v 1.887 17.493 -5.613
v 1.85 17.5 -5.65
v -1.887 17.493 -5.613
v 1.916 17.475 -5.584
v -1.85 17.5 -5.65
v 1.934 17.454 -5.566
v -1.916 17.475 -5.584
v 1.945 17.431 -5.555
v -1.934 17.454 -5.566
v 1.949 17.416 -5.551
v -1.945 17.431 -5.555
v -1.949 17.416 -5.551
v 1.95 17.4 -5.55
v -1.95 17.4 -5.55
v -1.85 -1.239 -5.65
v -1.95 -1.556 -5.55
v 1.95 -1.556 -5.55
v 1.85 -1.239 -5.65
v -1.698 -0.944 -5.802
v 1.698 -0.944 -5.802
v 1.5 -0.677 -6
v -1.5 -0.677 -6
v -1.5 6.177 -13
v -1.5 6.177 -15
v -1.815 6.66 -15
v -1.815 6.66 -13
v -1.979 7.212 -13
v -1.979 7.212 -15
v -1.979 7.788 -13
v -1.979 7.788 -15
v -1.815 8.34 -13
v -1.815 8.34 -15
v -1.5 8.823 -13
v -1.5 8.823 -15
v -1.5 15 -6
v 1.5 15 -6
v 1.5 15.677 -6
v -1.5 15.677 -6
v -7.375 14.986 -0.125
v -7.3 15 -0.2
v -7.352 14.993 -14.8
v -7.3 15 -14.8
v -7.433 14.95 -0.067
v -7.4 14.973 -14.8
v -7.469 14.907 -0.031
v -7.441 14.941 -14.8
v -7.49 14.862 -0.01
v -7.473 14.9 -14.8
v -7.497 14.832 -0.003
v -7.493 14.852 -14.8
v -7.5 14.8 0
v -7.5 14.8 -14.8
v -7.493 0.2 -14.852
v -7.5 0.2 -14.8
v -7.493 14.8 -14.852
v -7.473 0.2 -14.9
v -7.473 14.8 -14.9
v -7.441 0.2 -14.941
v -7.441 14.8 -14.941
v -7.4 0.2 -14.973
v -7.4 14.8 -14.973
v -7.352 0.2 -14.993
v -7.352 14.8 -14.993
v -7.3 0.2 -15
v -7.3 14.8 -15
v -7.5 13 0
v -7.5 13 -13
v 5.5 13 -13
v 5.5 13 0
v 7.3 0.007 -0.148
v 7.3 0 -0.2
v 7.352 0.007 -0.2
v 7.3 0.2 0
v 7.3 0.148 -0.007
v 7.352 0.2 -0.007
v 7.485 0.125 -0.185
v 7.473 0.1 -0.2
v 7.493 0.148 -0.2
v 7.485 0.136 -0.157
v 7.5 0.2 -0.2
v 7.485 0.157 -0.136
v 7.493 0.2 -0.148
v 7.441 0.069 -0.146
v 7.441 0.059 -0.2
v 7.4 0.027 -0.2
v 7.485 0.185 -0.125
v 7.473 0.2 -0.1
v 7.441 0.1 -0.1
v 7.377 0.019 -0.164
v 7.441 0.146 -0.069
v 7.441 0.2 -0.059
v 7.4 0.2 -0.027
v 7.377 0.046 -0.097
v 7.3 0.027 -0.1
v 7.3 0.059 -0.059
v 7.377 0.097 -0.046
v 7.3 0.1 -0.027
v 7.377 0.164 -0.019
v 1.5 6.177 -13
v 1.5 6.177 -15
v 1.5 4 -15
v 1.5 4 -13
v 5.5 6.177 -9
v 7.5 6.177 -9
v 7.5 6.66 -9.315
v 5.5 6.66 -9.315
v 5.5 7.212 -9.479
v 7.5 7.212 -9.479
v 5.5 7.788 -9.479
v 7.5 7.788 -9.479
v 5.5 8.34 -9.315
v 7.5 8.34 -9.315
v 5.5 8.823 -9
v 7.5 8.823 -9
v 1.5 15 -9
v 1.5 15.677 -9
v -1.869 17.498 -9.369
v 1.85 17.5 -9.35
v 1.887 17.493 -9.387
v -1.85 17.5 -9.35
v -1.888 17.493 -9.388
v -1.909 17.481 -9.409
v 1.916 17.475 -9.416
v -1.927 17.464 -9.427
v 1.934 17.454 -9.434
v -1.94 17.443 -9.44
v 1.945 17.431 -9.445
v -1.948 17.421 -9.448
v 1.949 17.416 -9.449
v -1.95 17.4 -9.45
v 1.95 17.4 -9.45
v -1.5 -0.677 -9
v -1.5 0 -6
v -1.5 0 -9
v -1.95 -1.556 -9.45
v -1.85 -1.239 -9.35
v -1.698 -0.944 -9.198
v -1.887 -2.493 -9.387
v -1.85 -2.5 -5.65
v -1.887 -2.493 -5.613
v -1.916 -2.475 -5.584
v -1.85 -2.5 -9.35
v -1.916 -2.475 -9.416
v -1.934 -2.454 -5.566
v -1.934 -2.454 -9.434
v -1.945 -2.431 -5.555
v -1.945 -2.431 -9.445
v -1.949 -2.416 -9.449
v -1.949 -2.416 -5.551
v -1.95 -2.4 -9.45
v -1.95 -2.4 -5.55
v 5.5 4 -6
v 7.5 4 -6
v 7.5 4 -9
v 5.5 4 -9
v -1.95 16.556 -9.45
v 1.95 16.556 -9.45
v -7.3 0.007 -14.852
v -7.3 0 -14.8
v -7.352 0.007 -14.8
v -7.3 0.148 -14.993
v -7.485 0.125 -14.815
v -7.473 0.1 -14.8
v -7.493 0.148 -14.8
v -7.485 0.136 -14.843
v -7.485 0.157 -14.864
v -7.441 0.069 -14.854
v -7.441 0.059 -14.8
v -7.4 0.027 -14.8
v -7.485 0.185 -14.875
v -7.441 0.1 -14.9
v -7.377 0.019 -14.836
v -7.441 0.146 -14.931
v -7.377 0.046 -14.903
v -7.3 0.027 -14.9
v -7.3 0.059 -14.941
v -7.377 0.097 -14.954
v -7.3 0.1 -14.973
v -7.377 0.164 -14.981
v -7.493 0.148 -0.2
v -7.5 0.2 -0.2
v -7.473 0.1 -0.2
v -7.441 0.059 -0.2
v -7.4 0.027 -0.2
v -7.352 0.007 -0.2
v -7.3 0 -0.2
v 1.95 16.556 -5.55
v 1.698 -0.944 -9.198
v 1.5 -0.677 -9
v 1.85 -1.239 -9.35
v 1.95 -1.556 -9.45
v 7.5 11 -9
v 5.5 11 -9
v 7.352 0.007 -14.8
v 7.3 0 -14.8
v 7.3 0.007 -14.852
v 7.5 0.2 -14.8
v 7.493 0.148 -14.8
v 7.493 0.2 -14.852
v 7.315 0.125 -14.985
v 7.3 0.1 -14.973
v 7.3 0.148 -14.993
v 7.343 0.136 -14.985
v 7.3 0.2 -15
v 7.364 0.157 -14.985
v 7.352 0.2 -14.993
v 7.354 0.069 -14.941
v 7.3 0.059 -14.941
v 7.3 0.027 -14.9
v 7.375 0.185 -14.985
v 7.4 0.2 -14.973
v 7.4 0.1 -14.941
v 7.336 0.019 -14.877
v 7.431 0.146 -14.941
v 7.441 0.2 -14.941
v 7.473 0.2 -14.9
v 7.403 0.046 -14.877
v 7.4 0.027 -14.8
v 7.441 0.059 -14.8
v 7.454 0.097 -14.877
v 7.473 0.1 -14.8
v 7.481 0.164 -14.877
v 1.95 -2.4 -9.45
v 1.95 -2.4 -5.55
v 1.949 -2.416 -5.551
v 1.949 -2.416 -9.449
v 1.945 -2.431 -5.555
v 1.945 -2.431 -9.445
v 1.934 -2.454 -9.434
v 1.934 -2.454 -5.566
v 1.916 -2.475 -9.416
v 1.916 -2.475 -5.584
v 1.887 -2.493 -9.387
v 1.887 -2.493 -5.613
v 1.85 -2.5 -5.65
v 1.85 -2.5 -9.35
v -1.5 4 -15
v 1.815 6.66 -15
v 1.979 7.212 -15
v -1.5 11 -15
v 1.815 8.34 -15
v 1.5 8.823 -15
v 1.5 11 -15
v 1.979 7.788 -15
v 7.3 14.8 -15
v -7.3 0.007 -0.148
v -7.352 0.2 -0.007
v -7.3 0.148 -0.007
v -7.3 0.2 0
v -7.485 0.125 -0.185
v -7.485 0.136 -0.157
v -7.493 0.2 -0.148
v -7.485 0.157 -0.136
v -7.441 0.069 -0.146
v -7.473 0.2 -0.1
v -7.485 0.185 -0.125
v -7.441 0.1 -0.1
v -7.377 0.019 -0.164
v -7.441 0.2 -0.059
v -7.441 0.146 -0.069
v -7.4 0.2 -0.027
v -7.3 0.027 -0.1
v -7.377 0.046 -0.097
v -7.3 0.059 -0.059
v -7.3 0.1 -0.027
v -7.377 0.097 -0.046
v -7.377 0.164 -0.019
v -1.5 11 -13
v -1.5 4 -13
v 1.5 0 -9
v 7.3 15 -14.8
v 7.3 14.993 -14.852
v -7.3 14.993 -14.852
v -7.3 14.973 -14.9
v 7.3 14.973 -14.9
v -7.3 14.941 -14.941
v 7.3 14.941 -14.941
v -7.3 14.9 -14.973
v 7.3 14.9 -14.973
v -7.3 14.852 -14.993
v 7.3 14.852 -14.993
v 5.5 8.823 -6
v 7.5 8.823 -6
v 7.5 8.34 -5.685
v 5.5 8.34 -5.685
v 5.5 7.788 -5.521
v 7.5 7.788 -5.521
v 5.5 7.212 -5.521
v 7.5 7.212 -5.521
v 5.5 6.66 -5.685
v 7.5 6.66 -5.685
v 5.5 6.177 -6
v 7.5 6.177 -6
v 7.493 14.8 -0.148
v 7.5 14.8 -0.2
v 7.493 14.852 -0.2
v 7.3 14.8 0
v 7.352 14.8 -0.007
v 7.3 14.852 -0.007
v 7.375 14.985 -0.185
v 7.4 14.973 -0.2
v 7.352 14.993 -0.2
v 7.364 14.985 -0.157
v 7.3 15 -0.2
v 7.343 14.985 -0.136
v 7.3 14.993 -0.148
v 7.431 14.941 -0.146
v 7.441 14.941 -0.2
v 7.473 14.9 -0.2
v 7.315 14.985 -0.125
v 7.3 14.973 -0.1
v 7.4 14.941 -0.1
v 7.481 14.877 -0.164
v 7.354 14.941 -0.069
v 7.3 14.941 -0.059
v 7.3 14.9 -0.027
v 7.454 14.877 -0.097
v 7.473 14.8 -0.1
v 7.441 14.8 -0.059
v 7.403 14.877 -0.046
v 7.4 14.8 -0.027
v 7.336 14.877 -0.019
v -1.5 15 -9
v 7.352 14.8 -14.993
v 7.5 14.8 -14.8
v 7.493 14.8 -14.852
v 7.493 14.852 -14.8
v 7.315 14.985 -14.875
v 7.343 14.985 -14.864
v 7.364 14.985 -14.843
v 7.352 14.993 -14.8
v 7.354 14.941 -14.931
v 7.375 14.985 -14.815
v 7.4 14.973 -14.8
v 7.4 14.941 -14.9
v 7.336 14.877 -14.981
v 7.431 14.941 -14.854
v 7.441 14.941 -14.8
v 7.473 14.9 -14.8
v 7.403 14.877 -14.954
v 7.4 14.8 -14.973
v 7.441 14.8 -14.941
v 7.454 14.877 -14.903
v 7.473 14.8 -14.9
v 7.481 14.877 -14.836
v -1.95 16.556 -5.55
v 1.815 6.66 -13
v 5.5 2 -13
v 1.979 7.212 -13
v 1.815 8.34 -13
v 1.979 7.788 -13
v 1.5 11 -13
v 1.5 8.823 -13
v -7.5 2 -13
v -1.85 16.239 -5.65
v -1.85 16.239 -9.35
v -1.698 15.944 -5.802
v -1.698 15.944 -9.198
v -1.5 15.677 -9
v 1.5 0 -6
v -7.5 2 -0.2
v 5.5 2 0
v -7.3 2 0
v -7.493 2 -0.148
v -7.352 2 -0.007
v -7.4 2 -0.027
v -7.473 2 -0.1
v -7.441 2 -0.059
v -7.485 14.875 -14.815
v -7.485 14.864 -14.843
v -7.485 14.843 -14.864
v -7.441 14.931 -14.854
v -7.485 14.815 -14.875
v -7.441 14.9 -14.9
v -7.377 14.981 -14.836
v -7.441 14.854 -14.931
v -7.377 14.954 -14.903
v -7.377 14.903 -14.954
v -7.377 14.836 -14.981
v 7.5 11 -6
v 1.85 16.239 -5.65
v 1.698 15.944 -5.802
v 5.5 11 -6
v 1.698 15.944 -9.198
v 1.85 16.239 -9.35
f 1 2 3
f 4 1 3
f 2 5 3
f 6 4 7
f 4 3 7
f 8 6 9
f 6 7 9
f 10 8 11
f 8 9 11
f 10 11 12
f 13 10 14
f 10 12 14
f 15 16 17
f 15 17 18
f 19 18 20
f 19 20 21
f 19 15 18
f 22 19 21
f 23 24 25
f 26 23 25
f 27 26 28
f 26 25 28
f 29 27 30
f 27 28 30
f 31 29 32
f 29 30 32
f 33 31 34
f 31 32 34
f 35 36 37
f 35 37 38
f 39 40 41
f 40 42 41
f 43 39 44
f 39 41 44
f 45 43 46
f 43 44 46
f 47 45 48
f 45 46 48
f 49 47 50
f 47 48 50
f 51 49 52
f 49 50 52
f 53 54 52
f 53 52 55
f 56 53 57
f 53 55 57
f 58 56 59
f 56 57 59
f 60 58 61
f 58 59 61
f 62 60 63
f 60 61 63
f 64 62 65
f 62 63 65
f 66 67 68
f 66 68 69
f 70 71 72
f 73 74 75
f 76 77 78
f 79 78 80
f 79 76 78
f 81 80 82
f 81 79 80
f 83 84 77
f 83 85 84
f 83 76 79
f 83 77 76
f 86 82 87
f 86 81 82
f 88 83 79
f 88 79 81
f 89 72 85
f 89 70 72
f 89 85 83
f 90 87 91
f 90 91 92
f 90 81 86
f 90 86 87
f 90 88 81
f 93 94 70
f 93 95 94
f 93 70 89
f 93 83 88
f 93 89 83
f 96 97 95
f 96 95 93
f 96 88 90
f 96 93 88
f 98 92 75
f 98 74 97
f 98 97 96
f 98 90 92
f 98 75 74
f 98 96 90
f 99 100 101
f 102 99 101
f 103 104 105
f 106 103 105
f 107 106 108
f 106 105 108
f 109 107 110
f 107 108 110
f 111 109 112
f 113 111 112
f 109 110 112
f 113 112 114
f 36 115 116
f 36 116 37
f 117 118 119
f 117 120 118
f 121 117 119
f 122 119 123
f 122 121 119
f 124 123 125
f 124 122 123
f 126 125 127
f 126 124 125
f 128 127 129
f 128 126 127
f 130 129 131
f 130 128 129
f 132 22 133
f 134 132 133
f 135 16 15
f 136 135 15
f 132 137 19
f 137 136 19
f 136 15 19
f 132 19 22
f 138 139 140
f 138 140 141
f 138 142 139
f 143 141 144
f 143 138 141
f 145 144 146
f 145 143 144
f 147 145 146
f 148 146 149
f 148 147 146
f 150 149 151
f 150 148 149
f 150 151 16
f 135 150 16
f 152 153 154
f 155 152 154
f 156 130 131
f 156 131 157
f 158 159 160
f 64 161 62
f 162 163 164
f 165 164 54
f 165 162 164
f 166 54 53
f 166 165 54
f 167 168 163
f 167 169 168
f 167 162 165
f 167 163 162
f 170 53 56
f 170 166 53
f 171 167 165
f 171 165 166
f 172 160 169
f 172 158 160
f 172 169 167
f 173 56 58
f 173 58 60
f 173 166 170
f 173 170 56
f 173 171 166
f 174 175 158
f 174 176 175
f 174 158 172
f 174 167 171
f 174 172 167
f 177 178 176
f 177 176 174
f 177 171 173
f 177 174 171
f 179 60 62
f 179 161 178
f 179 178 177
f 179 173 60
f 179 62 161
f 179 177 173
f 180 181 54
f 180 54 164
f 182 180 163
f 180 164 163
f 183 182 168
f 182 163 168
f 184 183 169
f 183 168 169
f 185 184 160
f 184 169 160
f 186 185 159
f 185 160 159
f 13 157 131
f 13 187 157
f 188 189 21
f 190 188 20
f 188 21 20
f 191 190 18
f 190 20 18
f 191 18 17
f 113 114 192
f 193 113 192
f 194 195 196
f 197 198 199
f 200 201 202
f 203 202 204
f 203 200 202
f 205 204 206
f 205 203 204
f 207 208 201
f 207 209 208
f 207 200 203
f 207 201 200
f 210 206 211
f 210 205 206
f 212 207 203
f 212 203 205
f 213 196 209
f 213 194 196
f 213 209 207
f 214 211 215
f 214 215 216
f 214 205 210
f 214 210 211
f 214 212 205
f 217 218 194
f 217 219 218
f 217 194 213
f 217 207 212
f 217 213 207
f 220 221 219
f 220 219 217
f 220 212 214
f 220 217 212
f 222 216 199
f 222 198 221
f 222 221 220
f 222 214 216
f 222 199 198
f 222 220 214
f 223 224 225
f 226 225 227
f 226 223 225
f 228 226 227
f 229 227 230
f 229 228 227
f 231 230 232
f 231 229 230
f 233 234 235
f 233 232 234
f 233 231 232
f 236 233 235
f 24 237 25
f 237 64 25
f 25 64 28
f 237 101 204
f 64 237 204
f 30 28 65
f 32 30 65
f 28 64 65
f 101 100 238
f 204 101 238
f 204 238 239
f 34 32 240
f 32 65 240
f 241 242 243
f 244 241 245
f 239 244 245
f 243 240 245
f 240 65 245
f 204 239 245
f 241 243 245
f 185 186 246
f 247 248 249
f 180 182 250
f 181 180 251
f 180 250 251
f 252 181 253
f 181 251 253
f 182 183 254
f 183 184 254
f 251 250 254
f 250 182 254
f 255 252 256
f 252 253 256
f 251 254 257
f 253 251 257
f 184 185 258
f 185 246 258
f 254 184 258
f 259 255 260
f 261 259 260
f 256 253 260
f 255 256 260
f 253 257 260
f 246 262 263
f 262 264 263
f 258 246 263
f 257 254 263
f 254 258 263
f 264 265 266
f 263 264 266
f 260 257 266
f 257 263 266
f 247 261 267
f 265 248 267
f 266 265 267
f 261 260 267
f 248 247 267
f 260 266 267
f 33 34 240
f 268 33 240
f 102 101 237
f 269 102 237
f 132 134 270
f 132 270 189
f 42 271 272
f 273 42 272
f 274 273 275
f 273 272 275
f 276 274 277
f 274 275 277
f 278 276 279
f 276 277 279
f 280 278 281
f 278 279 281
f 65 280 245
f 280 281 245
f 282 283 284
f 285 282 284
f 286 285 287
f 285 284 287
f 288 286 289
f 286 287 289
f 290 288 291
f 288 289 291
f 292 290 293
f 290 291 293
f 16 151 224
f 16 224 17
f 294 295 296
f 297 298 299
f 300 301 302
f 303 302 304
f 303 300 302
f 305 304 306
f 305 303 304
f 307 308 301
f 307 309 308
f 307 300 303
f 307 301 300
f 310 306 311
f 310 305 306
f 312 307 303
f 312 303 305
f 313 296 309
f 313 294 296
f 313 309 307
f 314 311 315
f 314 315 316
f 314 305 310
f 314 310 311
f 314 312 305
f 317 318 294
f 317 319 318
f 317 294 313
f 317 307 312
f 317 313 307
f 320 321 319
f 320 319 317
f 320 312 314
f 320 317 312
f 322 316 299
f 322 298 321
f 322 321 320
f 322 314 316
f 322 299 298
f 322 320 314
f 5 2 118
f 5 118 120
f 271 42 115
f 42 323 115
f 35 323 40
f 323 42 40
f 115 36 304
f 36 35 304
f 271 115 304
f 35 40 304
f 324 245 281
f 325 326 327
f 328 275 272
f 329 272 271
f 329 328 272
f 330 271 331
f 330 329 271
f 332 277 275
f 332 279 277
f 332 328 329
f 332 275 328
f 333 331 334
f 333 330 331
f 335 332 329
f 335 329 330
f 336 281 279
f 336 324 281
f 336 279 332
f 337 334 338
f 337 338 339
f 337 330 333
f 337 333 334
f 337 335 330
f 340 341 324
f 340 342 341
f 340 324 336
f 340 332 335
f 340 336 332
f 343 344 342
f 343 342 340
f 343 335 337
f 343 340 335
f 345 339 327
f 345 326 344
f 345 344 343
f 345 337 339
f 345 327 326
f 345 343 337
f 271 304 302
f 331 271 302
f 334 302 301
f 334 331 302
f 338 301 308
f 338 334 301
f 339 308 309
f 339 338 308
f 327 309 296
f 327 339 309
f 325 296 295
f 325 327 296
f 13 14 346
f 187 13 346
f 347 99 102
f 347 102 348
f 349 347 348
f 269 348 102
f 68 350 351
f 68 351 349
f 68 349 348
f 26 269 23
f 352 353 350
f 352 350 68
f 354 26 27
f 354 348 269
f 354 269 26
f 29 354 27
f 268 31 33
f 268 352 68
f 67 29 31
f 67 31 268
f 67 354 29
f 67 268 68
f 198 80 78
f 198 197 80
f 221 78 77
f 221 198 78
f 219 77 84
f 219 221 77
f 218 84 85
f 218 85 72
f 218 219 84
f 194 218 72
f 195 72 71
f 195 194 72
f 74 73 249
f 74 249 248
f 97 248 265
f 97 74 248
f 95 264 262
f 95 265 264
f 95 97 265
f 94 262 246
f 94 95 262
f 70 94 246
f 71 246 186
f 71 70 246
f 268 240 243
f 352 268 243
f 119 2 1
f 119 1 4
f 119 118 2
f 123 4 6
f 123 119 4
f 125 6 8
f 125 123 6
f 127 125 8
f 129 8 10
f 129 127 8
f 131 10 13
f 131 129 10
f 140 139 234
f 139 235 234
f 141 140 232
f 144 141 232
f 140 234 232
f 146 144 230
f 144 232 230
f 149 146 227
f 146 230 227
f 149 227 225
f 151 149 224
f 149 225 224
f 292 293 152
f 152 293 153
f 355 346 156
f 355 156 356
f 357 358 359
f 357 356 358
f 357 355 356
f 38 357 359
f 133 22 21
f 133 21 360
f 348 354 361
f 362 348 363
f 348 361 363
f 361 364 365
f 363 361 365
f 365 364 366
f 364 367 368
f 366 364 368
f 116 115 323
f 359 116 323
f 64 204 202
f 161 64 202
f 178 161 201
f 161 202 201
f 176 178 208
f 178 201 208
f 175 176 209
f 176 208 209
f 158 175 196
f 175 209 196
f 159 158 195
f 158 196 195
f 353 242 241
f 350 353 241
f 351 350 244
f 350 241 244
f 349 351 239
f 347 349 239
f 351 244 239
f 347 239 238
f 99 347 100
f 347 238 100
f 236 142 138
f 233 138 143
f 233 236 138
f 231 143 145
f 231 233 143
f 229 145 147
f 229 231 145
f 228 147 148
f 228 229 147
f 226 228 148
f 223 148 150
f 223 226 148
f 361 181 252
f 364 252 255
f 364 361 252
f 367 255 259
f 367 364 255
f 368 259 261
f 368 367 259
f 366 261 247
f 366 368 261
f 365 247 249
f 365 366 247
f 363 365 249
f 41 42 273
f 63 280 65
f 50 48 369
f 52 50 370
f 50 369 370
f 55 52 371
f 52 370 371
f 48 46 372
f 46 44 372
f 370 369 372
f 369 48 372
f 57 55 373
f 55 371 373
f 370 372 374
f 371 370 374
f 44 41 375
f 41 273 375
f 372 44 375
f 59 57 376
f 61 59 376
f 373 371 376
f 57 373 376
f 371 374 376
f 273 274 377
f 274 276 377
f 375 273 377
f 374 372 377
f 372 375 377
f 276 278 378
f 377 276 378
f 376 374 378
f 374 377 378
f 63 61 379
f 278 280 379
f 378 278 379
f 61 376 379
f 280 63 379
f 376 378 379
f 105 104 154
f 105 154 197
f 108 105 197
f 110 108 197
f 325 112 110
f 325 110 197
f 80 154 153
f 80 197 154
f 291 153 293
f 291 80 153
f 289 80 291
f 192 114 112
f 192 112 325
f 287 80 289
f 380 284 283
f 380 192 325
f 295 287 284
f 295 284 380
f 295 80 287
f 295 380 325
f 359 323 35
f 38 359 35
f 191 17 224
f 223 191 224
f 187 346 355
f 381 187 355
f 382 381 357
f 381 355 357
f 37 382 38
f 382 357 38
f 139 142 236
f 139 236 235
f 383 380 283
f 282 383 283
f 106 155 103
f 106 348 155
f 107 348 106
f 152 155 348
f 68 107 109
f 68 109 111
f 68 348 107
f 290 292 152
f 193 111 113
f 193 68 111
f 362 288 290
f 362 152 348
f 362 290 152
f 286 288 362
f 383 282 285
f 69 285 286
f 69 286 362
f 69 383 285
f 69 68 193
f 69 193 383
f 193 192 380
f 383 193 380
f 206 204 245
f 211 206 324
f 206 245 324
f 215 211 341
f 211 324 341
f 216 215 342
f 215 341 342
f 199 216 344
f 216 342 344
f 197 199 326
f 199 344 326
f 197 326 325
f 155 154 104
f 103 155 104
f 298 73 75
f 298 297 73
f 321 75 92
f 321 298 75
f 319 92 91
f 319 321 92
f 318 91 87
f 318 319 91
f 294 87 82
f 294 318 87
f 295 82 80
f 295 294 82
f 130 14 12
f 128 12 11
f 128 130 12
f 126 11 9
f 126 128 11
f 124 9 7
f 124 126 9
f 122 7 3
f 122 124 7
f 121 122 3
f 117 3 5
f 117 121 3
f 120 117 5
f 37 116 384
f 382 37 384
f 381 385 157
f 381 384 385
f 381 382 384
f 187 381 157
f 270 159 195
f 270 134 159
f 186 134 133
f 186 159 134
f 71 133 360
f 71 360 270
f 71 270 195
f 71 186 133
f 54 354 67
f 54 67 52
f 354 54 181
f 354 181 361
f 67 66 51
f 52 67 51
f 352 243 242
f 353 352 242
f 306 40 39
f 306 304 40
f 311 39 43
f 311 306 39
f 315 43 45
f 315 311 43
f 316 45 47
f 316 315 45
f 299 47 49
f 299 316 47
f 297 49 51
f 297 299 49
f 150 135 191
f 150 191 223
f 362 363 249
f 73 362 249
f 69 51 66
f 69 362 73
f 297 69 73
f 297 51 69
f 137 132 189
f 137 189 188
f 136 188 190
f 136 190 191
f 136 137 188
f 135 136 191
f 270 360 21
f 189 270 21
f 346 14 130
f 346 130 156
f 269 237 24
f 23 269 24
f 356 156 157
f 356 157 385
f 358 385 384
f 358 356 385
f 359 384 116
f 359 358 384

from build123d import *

# Parameters (mm, degrees)
SKETCH_1_W                      = 15
SKETCH_1_H                      = 15
EXTRUDE_1_DEPTH                 = 15
SKETCH_2_W                      = 13
SKETCH_2_H                      = 11
CUT_EXTRUDE_1_DEPTH             = 13
EXTRUDE_START                   = -4.5
EXTRUDE_2_DEPTH                 = 6
SKETCH_5_W                      = 3
SKETCH_5_H                      = 3
EXTRUDE_3_DEPTH                 = 1
CUT_EXTRUDE_3_REACH             = 26.238
CUT_EXTRUDE_4_REACH             = 29.5
CUT_EXTRUDE_5_REACH             = 26.238
CUT_EXTRUDE_5_DIRECTION_2_REACH = 26.238
FILLET_1_R                      = 0.1
FILLET_2_R                      = 0.2
EXTRUDE_4_DEPTH                 = 3
EXTRUDE_4_DEPTH_BACK            = 3
CUT_EXTRUDE_6_DEPTH             = 15
FILLET_3_R                      = 0.1


with BuildPart() as part:
    # 草图1 → 凸台-拉伸1 (new body)
    with BuildSketch(Plane.XY):
        with Locations((0, 7.5)):
            Rectangle(SKETCH_1_W, SKETCH_1_H)
    extrude(amount=-EXTRUDE_1_DEPTH)

    # 草图2 → 切除-拉伸1 (cut)
    with BuildSketch(Plane.ZY.offset(7.5)):
        with Locations((-6.5, 7.5)):
            Rectangle(SKETCH_2_W, SKETCH_2_H)
    extrude(amount=-CUT_EXTRUDE_1_DEPTH, mode=Mode.SUBTRACT)



with BuildPart() as body_2:
    # 草图4 → 凸台-拉伸2 (new body)
    with BuildSketch(Plane.XY.offset(EXTRUDE_START)):
        with BuildLine():
            Line((-1.5, 15.677124344), (1.5, 15.677124344))
            ThreePointArc((1.5, 15.677124344), (1.780042303, 16.088161527), (1.95, 16.555590279))
            Line((1.95, 16.555590279), (1.95, 17.5))
            Line((1.95, 17.5), (-1.95, 17.5))
            Line((-1.95, 17.5), (-1.95, 16.555590279))
            ThreePointArc((-1.95, 16.555590279), (-1.780042303, 16.088161527), (-1.5, 15.677124344))
        make_face()
    extrude(amount=-EXTRUDE_2_DEPTH)


with BuildPart() as part_1:
    add(part.part)

    add(body_2.part)  # 凸台-拉伸3 merges body 2
    # 草图5 → 凸台-拉伸3 (add)
    with BuildSketch(Plane(origin=(0, 15, 0), x_dir=(-1, 0, 0), z_dir=(0, 1, 0))):
        with Locations((0, -7.5)):
            Rectangle(SKETCH_5_W, SKETCH_5_H)
    extrude(amount=EXTRUDE_3_DEPTH)

    # 草图6 → 切除-拉伸3 (cut, up to next)
    with BuildSketch(Plane(origin=(0, 0, -15), x_dir=(-1, 0, 0), z_dir=(0, 0, -1)), mode=Mode.PRIVATE) as cut_extrude_3_sk1:
        with BuildLine():
            Line((-1.5, 6.177124344), (-1.5, 4))
            Line((-1.5, 4), (1.5, 4))
            Line((1.5, 4), (1.5, 6.177124344))
            ThreePointArc((1.5, 6.177124344), (2, 7.5), (1.5, 8.822875656))
            Line((1.5, 8.822875656), (1.5, 11))
            Line((1.5, 11), (-1.5, 11))
            Line((-1.5, 11), (-1.5, 8.822875656))
            ThreePointArc((-1.5, 8.822875656), (-2, 7.5), (-1.5, 6.177124344))
        make_face()
    cut_extrude_3_tool1 = extrude(cut_extrude_3_sk1.sketch, amount=-CUT_EXTRUDE_3_REACH, mode=Mode.PRIVATE) & part_1.part
    add(cut_extrude_3_tool1.solids().sort_by_distance((0, 7.5, -15))[0], mode=Mode.SUBTRACT)

    # 草图7 → 切除-拉伸4 (cut, up to next)
    with BuildSketch(Plane(origin=(7.5, 0, 0), x_dir=(0, 0, -1), z_dir=(1, 0, 0)), mode=Mode.PRIVATE) as cut_extrude_4_sk1:
        with BuildLine():
            Line((6, 6.177124344), (6, 4))
            Line((6, 4), (9, 4))
            Line((9, 4), (9, 6.177124344))
            ThreePointArc((9, 6.177124344), (9.5, 7.5), (9, 8.822875656))
            Line((9, 8.822875656), (9, 11))
            Line((9, 11), (6, 11))
            Line((6, 11), (6, 8.822875656))
            ThreePointArc((6, 8.822875656), (5.5, 7.5), (6, 6.177124344))
        make_face()
    cut_extrude_4_tool1 = extrude(cut_extrude_4_sk1.sketch, amount=-CUT_EXTRUDE_4_REACH, mode=Mode.PRIVATE) & part_1.part
    add(cut_extrude_4_tool1.solids().sort_by_distance((7.5, 7.5, -7.5))[0], mode=Mode.SUBTRACT)

    # 草图8 → 切除-拉伸5 (cut, up to next)
    with BuildSketch(Plane(origin=(0, 0, 0), x_dir=(0, 0, -1), z_dir=(1, 0, 0)), mode=Mode.PRIVATE) as cut_extrude_5_sk1:
        with BuildLine():
            Line((5.55, 17.5), (5.55, 16.555590279))
            ThreePointArc((5.55, 16.555590279), (5.719957697, 16.088161527), (6, 15.677124344))
            Line((6, 15.677124344), (4.5, 15.677124344))
            Line((4.5, 15.677124344), (4.5, 17.5))
            Line((4.5, 17.5), (5.55, 17.5))
        make_face()
    cut_extrude_5_tool1 = extrude(cut_extrude_5_sk1.sketch, amount=-CUT_EXTRUDE_5_REACH, mode=Mode.PRIVATE) & part_1.part
    # 草图8 → 切除-拉伸5 (cut, up to next)
    with BuildSketch(Plane(origin=(0, 0, 0), x_dir=(0, 0, -1), z_dir=(1, 0, 0)), mode=Mode.PRIVATE) as cut_extrude_5_sk2:
        with BuildLine():
            Line((10.5, 17.5), (9.45, 17.5))
            Line((9.45, 17.5), (9.45, 16.555590279))
            ThreePointArc((9.45, 16.555590279), (9.280042303, 16.088161527), (9, 15.677124344))
            Line((9, 15.677124344), (10.5, 15.677124344))
            Line((10.5, 15.677124344), (10.5, 17.5))
        make_face()
    cut_extrude_5_tool2 = extrude(cut_extrude_5_sk2.sketch, amount=-CUT_EXTRUDE_5_REACH, mode=Mode.PRIVATE) & part_1.part
    add(cut_extrude_5_tool1.solids().sort_by_distance((0, 16.539049, -5.075076))[0], mode=Mode.SUBTRACT)
    add(cut_extrude_5_tool2.solids().sort_by_distance((0, 16.539049, -9.924924))[0], mode=Mode.SUBTRACT)

    # 草图8 → 切除-拉伸5 direction 2 (cut, up to next)
    with BuildSketch(Plane(origin=(0, 0, 0), x_dir=(0, 0, -1), z_dir=(1, 0, 0)), mode=Mode.PRIVATE) as cut_extrude_5_direction_2_sk1:
        with BuildLine():
            Line((5.55, 17.5), (5.55, 16.555590279))
            ThreePointArc((5.55, 16.555590279), (5.719957697, 16.088161527), (6, 15.677124344))
            Line((6, 15.677124344), (4.5, 15.677124344))
            Line((4.5, 15.677124344), (4.5, 17.5))
            Line((4.5, 17.5), (5.55, 17.5))
        make_face()
    cut_extrude_5_direction_2_tool1 = extrude(cut_extrude_5_direction_2_sk1.sketch, amount=CUT_EXTRUDE_5_DIRECTION_2_REACH, mode=Mode.PRIVATE) & part_1.part
    # 草图8 → 切除-拉伸5 direction 2 (cut, up to next)
    with BuildSketch(Plane(origin=(0, 0, 0), x_dir=(0, 0, -1), z_dir=(1, 0, 0)), mode=Mode.PRIVATE) as cut_extrude_5_direction_2_sk2:
        with BuildLine():
            Line((10.5, 17.5), (9.45, 17.5))
            Line((9.45, 17.5), (9.45, 16.555590279))
            ThreePointArc((9.45, 16.555590279), (9.280042303, 16.088161527), (9, 15.677124344))
            Line((9, 15.677124344), (10.5, 15.677124344))
            Line((10.5, 15.677124344), (10.5, 17.5))
        make_face()
    cut_extrude_5_direction_2_tool2 = extrude(cut_extrude_5_direction_2_sk2.sketch, amount=CUT_EXTRUDE_5_DIRECTION_2_REACH, mode=Mode.PRIVATE) & part_1.part
    add(cut_extrude_5_direction_2_tool1.solids().sort_by_distance((0, 16.539049, -5.075076))[0], mode=Mode.SUBTRACT)
    add(cut_extrude_5_direction_2_tool2.solids().sort_by_distance((0, 16.539049, -9.924924))[0], mode=Mode.SUBTRACT)

    # 圆角1
    fillet_1_edges = [part_1.edges().sort_by_distance(p)[0] for p in [
        (0, 17.5, -5.55),
        (1.95, 17.5, -7.5),
        (-1.95, 17.5, -7.5),
        (0, 17.5, -9.45),
    ]]
    fillet(fillet_1_edges, radius=FILLET_1_R)

    # 圆角2
    fillet_2_edges = [part_1.edges().sort_by_distance(p)[0] for p in [
        (0, 0, 0),
        (7.5, 0, -7.5),
        (0, 0, -15),
        (-7.5, 0, -7.5),
        (7.5, 7.5, -15),
        (0, 15, -15),
        (-7.5, 15, -7.5),
        (-7.5, 7.5, -15),
        (-7.5, 1, 0),
        (7.5, 7.5, 0),
        (7.5, 15, -7.5),
        (0, 15, 0),
    ]]
    fillet(fillet_2_edges, radius=FILLET_2_R)

    # 草图9 → 凸台-拉伸4 (add, two sides: drawn at the far end of the back side and taken through both)
    with BuildSketch(Plane(origin=(0, 0, 0), x_dir=(0, 0, -1), z_dir=(1, 0, 0)).offset(-EXTRUDE_4_DEPTH_BACK)):
        with BuildLine():
            Line((6, 0), (9, 0))
            Line((9, 0), (9, -0.677124344))
            ThreePointArc((9, -0.677124344), (9.280042303, -1.088161527), (9.45, -1.555590279))
            Line((9.45, -1.555590279), (9.45, -2.5))
            Line((9.45, -2.5), (5.55, -2.5))
            Line((5.55, -2.5), (5.55, -1.555590279))
            ThreePointArc((5.55, -1.555590279), (5.719957697, -1.088161527), (6, -0.677124344))
            Line((6, -0.677124344), (6, 0))
        make_face()
    extrude(amount=EXTRUDE_4_DEPTH + EXTRUDE_4_DEPTH_BACK)

    # 草图10 → 切除-拉伸6 (cut)
    with BuildSketch(Plane.XY):
        with BuildLine():
            Line((-1.95, -2.5), (-1.95, -1.555590279))
            ThreePointArc((-1.95, -1.555590279), (-1.780042303, -1.088161527), (-1.5, -0.677124344))
            Line((-1.5, -0.677124344), (-1.5, 0))
            Line((-1.5, 0), (-3, 0))
            Line((-3, 0), (-3, -2.5))
            Line((-3, -2.5), (-1.95, -2.5))
        make_face()
        with BuildLine():
            Line((1.5, 0), (1.5, -0.677124344))
            ThreePointArc((1.5, -0.677124344), (1.780042303, -1.088161527), (1.95, -1.555590279))
            Line((1.95, -1.555590279), (1.95, -2.5))
            Line((1.95, -2.5), (3, -2.5))
            Line((3, -2.5), (3, 0))
            Line((3, 0), (1.5, 0))
        make_face()
    extrude(amount=-CUT_EXTRUDE_6_DEPTH, mode=Mode.SUBTRACT)

    # 圆角3
    fillet_3_edges = [part_1.edges().sort_by_distance(p)[0] for p in [
        (0, -2.5, -9.45),
        (0, -2.5, -5.55),
        (-1.95, -2.5, -7.5),
        (1.95, -2.5, -7.5),
    ]]
    fillet(fillet_3_edges, radius=FILLET_3_R)


solid = part_1.part
